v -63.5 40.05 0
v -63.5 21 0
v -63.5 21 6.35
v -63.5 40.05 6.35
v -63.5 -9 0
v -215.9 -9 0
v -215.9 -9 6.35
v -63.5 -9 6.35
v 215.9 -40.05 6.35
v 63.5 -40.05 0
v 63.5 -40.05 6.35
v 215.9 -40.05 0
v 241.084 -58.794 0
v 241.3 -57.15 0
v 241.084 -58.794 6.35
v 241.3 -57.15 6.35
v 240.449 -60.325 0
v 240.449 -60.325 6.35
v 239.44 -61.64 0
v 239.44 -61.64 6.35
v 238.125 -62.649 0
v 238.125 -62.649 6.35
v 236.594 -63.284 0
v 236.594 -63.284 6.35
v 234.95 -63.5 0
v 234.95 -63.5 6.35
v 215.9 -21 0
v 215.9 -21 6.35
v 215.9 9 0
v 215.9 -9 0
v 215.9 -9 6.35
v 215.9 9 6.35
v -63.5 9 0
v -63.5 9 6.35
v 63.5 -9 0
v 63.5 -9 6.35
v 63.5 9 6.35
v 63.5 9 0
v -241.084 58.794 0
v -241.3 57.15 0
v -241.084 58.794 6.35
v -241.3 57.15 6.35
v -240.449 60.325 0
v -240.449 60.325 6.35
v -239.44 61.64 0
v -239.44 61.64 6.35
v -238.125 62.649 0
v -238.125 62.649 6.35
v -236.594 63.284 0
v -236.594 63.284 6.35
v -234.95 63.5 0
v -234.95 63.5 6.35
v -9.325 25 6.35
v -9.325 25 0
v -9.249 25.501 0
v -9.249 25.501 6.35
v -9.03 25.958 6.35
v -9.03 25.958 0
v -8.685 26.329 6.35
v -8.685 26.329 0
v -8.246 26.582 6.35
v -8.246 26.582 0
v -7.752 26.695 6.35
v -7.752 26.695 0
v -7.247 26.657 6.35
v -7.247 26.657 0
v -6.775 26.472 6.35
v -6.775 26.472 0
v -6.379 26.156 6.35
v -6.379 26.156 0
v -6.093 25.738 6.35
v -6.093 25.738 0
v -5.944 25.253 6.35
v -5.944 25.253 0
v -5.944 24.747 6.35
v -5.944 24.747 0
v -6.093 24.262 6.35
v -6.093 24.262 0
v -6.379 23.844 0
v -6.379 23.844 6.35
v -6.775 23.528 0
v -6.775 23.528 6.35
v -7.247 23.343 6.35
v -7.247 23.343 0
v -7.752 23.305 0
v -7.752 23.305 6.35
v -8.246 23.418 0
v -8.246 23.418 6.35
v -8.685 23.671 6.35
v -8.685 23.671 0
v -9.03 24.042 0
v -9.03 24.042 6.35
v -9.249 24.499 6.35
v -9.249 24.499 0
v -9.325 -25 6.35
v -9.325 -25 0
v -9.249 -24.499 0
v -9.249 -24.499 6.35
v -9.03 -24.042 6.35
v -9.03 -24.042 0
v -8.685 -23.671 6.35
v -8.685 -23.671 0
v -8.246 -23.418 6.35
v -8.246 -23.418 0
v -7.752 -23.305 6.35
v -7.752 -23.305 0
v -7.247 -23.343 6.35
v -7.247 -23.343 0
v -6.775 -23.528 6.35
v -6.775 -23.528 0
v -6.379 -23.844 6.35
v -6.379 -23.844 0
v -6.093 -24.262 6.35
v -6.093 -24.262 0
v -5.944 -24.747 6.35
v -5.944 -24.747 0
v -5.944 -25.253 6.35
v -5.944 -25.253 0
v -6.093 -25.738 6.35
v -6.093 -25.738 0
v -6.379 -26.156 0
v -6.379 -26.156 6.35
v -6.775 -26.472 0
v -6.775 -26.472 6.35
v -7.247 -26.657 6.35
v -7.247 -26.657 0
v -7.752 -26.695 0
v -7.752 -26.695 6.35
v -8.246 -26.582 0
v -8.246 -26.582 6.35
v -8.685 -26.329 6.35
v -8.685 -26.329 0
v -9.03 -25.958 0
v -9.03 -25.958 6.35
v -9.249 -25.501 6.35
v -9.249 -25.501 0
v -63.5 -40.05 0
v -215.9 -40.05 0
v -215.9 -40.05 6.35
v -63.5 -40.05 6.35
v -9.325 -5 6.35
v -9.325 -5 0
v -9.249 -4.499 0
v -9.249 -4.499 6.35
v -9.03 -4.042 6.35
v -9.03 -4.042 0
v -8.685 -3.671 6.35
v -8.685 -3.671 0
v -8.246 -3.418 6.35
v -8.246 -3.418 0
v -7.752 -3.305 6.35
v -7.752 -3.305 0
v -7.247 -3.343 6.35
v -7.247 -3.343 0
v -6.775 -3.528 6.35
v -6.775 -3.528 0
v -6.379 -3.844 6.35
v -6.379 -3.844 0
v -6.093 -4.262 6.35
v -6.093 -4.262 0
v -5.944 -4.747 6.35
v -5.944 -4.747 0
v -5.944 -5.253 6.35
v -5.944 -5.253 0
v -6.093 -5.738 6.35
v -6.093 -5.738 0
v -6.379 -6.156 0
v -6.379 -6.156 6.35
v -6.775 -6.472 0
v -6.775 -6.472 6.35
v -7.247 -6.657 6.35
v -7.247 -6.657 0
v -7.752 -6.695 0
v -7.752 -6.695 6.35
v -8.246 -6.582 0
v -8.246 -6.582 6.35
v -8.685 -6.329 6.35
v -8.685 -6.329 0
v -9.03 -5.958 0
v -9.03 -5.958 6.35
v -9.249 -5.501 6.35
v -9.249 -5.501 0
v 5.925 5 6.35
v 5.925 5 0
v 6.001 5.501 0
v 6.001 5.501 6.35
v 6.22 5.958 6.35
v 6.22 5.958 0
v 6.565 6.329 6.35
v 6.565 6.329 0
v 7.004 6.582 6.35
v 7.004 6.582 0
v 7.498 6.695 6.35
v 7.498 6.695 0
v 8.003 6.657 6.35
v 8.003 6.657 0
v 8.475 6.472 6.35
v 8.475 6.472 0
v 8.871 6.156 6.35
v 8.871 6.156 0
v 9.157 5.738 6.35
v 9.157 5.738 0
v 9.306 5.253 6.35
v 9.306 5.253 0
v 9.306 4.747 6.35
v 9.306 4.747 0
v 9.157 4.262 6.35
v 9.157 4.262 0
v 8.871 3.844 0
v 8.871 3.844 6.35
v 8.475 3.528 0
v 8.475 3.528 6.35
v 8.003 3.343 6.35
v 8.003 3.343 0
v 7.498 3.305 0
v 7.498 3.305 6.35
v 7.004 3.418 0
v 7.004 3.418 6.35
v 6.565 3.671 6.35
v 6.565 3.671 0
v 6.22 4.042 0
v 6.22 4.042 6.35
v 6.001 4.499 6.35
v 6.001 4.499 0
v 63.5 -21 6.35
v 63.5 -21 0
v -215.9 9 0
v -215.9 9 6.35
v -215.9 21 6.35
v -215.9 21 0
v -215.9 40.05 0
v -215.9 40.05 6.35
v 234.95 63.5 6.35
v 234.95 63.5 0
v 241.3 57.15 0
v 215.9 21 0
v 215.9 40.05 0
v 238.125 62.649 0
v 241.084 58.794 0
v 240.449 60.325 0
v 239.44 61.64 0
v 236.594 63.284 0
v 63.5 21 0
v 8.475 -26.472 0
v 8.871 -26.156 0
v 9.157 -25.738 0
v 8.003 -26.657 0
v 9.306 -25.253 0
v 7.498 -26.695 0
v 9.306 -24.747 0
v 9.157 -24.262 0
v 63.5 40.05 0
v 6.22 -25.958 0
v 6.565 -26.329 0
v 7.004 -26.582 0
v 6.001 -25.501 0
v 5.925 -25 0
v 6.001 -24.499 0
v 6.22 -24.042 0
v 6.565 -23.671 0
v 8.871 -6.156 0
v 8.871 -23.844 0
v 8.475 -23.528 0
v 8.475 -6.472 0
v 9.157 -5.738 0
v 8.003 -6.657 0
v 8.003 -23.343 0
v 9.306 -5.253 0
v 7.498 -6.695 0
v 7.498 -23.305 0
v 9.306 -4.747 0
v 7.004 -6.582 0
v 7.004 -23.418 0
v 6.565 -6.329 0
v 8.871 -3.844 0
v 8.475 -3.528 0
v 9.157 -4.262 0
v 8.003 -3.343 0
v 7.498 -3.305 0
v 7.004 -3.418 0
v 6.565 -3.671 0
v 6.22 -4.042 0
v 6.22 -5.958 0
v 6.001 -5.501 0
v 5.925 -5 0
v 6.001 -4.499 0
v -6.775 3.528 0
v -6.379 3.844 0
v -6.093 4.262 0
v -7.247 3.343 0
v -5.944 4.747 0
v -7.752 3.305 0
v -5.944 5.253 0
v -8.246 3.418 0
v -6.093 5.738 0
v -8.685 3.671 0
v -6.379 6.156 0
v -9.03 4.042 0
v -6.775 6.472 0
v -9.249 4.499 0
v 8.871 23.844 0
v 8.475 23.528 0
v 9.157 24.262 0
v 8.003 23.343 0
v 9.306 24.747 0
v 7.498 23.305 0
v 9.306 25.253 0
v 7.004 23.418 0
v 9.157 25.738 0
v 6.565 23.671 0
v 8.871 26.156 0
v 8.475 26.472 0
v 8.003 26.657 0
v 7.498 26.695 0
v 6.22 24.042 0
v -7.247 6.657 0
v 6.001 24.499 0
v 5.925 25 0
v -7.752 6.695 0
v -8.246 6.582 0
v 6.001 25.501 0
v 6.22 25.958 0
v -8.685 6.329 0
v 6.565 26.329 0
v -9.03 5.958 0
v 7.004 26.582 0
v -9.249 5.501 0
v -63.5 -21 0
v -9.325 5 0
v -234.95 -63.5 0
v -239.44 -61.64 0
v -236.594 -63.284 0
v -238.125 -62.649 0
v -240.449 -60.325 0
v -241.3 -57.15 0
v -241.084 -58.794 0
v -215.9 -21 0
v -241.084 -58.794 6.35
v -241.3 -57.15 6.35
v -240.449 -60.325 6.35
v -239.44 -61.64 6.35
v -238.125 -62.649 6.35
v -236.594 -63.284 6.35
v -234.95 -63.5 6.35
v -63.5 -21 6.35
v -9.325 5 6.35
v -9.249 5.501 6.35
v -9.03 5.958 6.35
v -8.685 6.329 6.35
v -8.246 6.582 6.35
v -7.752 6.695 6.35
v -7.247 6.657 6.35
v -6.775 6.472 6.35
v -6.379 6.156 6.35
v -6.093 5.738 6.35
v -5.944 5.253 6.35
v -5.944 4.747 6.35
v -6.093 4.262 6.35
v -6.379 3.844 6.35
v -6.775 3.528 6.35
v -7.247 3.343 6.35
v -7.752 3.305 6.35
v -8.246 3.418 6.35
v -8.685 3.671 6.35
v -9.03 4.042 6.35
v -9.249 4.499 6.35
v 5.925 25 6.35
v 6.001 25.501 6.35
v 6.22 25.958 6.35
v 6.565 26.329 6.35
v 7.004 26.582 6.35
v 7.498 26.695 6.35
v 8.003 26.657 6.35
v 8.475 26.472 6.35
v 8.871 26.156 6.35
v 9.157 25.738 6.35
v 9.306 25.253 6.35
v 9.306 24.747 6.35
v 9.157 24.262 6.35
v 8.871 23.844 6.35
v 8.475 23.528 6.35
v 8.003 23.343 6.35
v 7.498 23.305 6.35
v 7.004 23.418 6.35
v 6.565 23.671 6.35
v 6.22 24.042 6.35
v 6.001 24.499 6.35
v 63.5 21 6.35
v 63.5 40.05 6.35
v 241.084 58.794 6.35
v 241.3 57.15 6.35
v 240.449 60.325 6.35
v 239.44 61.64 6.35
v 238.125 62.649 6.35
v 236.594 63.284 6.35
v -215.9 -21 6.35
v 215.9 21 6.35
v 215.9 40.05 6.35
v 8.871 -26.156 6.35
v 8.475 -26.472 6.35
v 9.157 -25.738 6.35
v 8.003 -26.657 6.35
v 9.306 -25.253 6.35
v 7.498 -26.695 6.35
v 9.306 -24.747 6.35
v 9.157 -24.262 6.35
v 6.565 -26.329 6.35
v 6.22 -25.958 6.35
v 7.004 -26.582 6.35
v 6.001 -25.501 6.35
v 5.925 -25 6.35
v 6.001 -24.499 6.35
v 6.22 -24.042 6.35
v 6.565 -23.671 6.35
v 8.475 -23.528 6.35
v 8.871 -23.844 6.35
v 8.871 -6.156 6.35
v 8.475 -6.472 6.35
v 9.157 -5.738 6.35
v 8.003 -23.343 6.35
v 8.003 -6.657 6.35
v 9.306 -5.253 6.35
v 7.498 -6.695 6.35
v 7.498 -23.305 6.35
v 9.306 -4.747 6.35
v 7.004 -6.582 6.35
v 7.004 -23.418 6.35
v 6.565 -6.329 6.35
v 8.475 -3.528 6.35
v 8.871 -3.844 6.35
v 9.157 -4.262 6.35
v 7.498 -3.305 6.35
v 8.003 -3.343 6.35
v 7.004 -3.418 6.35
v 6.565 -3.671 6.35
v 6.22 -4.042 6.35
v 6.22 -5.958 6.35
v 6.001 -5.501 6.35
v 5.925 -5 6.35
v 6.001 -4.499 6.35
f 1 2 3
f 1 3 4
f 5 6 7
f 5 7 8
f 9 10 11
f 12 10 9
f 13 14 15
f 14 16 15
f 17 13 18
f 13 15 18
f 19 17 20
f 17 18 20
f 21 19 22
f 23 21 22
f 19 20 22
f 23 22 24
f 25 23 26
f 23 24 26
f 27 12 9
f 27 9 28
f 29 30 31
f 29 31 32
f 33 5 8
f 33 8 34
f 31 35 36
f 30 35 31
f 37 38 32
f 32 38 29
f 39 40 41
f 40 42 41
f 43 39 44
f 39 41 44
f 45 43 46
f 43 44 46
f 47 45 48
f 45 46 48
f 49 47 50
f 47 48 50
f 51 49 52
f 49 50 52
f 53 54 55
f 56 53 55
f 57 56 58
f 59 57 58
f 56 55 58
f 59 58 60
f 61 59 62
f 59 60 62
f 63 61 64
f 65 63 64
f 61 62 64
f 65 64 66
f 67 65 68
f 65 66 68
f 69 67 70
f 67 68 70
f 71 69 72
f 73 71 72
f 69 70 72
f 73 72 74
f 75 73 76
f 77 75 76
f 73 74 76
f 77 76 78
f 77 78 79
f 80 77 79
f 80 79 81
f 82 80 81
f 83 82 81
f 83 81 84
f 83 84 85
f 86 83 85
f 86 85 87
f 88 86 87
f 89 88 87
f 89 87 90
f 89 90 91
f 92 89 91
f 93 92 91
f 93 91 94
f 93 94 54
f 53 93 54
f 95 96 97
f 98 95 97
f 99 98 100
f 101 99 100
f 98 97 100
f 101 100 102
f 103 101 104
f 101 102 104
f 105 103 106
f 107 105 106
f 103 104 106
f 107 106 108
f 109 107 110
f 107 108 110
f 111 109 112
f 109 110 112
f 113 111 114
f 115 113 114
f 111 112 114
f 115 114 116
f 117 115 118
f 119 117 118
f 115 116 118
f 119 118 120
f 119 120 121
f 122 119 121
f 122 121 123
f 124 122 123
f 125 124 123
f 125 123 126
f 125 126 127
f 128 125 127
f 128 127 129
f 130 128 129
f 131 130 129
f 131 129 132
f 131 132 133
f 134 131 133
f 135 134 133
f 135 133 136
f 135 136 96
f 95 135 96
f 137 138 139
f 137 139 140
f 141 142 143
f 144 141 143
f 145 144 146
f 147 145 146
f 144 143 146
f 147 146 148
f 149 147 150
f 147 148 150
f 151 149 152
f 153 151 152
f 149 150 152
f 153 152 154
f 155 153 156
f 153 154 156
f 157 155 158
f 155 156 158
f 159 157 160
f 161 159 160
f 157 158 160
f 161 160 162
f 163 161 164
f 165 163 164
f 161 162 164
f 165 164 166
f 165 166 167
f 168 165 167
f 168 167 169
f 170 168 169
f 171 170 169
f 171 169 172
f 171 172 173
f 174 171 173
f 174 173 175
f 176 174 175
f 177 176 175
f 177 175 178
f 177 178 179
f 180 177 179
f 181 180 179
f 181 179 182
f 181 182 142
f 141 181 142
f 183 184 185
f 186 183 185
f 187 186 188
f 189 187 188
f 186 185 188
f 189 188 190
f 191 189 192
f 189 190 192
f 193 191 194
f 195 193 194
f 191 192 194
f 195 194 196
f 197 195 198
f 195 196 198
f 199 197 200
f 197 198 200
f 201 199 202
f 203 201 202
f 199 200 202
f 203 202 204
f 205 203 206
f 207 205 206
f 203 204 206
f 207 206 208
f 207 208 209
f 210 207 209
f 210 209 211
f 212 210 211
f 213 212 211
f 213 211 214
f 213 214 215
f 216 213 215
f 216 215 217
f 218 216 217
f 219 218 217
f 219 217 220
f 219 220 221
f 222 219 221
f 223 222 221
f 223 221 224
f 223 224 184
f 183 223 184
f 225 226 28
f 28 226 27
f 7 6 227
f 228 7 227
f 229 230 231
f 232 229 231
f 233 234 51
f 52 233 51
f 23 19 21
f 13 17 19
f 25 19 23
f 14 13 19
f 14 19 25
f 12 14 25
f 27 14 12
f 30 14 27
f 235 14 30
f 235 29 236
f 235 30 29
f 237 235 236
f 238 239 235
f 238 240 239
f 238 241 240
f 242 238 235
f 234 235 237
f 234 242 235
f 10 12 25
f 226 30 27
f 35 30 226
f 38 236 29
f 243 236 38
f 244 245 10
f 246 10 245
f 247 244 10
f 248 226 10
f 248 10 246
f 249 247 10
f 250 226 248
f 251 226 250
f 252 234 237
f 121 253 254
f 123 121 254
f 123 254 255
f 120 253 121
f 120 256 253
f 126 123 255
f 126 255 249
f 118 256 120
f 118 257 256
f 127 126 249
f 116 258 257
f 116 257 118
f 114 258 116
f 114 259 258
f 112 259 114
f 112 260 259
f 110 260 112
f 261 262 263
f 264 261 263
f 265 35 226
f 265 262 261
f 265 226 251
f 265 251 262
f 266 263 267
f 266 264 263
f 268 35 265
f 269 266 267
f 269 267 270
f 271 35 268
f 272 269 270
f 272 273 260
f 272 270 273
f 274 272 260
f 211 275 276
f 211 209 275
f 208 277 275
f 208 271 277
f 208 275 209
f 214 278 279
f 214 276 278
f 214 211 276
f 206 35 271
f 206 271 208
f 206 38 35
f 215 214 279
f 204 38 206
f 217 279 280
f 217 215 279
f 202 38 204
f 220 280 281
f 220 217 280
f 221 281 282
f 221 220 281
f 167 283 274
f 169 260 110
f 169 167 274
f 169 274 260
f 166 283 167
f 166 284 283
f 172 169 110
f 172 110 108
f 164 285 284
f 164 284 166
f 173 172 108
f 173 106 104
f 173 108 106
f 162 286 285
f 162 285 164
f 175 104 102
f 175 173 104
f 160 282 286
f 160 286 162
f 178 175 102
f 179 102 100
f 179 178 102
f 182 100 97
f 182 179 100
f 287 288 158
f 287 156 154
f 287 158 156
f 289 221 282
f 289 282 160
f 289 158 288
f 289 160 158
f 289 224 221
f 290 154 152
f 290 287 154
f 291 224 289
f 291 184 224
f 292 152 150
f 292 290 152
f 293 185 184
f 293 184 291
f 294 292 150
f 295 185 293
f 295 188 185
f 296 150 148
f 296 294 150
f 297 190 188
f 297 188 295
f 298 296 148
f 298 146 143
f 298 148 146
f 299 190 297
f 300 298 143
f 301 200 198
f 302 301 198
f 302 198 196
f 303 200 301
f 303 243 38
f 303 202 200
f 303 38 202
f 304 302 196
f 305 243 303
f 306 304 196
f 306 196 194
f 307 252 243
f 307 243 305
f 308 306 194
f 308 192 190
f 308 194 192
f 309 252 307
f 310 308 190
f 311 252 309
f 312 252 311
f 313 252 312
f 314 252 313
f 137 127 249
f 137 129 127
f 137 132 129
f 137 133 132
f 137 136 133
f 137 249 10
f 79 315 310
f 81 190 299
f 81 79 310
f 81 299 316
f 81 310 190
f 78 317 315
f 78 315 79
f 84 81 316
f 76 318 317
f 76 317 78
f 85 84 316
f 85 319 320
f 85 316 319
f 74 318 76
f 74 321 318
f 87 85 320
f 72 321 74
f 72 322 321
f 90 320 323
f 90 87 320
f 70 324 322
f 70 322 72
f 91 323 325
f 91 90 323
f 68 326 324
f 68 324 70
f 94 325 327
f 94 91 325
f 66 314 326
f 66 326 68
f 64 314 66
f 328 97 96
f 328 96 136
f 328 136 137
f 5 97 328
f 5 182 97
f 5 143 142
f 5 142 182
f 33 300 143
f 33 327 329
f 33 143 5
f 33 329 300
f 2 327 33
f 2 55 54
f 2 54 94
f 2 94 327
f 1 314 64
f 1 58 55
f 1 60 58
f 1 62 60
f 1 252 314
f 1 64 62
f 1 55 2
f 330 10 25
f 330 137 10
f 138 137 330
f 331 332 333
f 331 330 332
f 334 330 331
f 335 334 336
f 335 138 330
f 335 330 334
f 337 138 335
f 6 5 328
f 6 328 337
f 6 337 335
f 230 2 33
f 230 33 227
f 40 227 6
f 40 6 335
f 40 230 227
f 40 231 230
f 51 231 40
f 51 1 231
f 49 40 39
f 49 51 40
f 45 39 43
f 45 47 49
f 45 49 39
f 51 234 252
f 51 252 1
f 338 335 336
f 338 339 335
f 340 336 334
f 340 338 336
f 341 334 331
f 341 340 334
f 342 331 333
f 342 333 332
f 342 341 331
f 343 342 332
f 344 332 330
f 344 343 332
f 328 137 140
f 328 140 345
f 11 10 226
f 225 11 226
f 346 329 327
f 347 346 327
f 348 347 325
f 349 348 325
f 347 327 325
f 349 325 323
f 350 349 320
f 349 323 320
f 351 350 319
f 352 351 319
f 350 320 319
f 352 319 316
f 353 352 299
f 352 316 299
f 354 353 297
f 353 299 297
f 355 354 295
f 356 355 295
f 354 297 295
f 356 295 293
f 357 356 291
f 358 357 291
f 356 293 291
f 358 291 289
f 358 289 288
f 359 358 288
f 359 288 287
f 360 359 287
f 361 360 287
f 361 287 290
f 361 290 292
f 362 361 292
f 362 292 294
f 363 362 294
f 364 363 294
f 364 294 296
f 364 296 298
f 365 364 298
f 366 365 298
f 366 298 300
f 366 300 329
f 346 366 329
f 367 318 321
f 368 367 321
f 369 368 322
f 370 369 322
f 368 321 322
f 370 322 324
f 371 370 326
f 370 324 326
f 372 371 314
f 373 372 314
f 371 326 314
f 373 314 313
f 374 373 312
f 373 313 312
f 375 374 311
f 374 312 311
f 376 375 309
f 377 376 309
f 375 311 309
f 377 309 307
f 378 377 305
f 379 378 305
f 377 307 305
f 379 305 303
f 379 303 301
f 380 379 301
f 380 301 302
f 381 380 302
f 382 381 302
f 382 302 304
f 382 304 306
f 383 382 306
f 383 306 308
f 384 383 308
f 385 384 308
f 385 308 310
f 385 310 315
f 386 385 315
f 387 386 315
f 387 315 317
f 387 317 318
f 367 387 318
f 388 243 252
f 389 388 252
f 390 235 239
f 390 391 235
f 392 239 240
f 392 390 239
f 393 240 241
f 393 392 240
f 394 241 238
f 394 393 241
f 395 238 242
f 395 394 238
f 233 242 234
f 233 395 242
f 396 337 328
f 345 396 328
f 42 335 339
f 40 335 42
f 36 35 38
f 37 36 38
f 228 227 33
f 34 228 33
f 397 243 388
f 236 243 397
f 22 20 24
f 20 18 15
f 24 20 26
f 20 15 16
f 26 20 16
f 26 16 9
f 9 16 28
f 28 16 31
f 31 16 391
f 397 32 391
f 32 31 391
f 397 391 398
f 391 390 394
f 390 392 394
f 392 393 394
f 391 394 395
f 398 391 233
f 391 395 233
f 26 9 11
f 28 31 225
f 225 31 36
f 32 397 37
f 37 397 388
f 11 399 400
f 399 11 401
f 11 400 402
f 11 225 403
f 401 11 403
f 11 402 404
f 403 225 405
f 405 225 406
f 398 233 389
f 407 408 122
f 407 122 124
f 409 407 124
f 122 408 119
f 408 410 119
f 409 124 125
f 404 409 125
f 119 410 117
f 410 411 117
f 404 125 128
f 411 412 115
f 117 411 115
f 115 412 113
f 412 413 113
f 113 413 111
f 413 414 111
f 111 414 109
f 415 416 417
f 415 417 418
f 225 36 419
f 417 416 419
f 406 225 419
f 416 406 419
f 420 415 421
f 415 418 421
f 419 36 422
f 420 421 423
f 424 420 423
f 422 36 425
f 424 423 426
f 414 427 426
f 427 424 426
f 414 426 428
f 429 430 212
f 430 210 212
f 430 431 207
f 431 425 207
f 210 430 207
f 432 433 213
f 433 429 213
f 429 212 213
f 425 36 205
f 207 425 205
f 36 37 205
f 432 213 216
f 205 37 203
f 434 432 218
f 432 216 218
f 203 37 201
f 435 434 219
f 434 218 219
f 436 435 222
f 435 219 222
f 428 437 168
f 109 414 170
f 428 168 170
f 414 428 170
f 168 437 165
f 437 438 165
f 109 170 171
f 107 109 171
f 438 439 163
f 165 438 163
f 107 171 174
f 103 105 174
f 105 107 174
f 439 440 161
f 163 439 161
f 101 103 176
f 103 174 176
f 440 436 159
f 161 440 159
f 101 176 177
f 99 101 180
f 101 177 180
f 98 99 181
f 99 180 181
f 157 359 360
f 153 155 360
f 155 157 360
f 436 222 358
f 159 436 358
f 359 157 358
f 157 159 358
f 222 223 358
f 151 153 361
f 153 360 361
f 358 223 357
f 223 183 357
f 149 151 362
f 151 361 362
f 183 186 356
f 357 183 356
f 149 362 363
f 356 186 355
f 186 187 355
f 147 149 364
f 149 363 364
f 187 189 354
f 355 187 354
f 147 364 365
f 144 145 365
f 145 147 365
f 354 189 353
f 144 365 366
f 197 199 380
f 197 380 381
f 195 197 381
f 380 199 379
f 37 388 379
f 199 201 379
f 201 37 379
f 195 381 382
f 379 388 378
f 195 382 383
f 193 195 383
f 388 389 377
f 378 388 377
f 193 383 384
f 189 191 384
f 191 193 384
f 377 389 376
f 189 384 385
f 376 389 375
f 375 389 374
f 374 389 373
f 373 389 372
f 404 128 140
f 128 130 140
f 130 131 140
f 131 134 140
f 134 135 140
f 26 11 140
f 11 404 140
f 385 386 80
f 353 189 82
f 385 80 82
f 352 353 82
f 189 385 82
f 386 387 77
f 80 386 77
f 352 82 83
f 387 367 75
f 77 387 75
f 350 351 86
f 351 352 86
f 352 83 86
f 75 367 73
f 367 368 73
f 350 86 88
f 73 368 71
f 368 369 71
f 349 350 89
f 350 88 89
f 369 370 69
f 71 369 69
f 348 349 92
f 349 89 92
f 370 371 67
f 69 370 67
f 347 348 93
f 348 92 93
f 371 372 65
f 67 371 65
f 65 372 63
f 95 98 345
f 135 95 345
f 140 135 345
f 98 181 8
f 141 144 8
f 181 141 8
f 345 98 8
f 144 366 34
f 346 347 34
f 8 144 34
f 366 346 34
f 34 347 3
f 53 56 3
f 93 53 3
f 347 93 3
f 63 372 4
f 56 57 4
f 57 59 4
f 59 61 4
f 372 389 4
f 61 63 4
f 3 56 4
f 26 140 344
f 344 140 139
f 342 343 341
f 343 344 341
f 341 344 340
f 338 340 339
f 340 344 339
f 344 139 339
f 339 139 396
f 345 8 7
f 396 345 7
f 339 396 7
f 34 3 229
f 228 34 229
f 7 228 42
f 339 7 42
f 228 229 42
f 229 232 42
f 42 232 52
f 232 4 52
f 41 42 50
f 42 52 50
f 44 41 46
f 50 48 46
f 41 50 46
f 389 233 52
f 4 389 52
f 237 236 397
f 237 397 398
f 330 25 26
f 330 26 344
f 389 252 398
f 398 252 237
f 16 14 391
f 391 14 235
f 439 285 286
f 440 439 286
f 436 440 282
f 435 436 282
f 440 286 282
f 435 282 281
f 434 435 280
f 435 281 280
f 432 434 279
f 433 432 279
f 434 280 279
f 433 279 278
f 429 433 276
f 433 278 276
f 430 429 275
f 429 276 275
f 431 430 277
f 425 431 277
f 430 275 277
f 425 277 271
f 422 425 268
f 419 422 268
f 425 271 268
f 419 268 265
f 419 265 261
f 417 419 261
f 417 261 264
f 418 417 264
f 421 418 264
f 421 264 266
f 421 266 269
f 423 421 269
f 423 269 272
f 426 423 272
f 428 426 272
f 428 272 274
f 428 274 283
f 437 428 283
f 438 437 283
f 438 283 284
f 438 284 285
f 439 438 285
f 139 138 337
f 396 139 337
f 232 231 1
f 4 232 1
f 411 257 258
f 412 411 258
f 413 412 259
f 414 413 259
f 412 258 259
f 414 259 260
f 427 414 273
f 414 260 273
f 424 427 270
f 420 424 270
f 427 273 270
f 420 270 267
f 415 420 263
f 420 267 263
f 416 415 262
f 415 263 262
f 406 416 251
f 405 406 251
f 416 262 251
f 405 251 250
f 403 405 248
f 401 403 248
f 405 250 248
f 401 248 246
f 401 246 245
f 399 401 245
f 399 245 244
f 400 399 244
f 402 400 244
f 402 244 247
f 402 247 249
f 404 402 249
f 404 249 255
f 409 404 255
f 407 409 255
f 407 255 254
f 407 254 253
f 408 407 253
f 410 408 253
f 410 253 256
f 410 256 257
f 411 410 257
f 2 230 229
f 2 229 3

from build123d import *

# Parameters (mm, degrees)
SKETCH1_W            = 482.6
SKETCH1_H            = 101.6
SKETCH1_W_2          = 152.4
SKETCH1_H_2          = 19.05
SKETCH1_H_3          = 18
BOSS_EXTRUDE1_DEPTH  = 6.35
M3_CLEARANCE_HOLE1_D = 3.4
SKETCH4_W            = 482.6
SKETCH4_H            = 12.7
BOSS_EXTRUDE2_DEPTH  = 6.35
FILLET2_R            = 6.35


with BuildPart() as part:
    # Sketch1 → Boss-Extrude1 (new body)
    with BuildSketch(Plane.XY):
        Rectangle(SKETCH1_W, SKETCH1_H)
        with Locations((-139.7, -30.525)):
            Rectangle(SKETCH1_W_2, SKETCH1_H_2, mode=Mode.SUBTRACT)
        with Locations((139.7, -30.525)):
            Rectangle(SKETCH1_W_2, SKETCH1_H_2, mode=Mode.SUBTRACT)
        with Locations((-139.7, 0)):
            Rectangle(SKETCH1_W_2, SKETCH1_H_3, mode=Mode.SUBTRACT)
        with Locations((-139.7, 30.525)):
            Rectangle(SKETCH1_W_2, SKETCH1_H_2, mode=Mode.SUBTRACT)
        with Locations((139.7, 0)):
            Rectangle(SKETCH1_W_2, SKETCH1_H_3, mode=Mode.SUBTRACT)
        with Locations((139.7, 30.525)):
            Rectangle(SKETCH1_W_2, SKETCH1_H_2, mode=Mode.SUBTRACT)
    extrude(amount=BOSS_EXTRUDE1_DEPTH)

    # M3 Clearance Hole1 (through all)
    with Locations(Plane.XY.offset(6.35)):
        with Locations((7.625, 5), (7.625, 25), (7.625, -5), (-7.625, 25), (-7.625, 5), (7.625, -25), (-7.625, -25), (-7.625, -5)):
            Hole(M3_CLEARANCE_HOLE1_D / 2)

    # Sketch4 → Boss-Extrude2 (add)
    with BuildSketch(Plane(origin=(0, 0, 0), x_dir=(-1, 0, 0), z_dir=(0, 0, -1))):
        with Locations((0, -57.15)):
            Rectangle(SKETCH4_W, SKETCH4_H)
        with Locations((0, 57.15)):
            Rectangle(SKETCH4_W, SKETCH4_H)
    extrude(amount=-BOSS_EXTRUDE2_DEPTH)

    # Fillet2
    fillet2_edges = [part.edges().sort_by_distance(p)[0] for p in [
        (241.3, -63.5, 3.175),
        (-241.3, -63.5, 3.175),
        (241.3, 63.5, 3.175),
        (-241.3, 63.5, 3.175),
    ]]
    fillet(fillet2_edges, radius=FILLET2_R)


solid = part.part
